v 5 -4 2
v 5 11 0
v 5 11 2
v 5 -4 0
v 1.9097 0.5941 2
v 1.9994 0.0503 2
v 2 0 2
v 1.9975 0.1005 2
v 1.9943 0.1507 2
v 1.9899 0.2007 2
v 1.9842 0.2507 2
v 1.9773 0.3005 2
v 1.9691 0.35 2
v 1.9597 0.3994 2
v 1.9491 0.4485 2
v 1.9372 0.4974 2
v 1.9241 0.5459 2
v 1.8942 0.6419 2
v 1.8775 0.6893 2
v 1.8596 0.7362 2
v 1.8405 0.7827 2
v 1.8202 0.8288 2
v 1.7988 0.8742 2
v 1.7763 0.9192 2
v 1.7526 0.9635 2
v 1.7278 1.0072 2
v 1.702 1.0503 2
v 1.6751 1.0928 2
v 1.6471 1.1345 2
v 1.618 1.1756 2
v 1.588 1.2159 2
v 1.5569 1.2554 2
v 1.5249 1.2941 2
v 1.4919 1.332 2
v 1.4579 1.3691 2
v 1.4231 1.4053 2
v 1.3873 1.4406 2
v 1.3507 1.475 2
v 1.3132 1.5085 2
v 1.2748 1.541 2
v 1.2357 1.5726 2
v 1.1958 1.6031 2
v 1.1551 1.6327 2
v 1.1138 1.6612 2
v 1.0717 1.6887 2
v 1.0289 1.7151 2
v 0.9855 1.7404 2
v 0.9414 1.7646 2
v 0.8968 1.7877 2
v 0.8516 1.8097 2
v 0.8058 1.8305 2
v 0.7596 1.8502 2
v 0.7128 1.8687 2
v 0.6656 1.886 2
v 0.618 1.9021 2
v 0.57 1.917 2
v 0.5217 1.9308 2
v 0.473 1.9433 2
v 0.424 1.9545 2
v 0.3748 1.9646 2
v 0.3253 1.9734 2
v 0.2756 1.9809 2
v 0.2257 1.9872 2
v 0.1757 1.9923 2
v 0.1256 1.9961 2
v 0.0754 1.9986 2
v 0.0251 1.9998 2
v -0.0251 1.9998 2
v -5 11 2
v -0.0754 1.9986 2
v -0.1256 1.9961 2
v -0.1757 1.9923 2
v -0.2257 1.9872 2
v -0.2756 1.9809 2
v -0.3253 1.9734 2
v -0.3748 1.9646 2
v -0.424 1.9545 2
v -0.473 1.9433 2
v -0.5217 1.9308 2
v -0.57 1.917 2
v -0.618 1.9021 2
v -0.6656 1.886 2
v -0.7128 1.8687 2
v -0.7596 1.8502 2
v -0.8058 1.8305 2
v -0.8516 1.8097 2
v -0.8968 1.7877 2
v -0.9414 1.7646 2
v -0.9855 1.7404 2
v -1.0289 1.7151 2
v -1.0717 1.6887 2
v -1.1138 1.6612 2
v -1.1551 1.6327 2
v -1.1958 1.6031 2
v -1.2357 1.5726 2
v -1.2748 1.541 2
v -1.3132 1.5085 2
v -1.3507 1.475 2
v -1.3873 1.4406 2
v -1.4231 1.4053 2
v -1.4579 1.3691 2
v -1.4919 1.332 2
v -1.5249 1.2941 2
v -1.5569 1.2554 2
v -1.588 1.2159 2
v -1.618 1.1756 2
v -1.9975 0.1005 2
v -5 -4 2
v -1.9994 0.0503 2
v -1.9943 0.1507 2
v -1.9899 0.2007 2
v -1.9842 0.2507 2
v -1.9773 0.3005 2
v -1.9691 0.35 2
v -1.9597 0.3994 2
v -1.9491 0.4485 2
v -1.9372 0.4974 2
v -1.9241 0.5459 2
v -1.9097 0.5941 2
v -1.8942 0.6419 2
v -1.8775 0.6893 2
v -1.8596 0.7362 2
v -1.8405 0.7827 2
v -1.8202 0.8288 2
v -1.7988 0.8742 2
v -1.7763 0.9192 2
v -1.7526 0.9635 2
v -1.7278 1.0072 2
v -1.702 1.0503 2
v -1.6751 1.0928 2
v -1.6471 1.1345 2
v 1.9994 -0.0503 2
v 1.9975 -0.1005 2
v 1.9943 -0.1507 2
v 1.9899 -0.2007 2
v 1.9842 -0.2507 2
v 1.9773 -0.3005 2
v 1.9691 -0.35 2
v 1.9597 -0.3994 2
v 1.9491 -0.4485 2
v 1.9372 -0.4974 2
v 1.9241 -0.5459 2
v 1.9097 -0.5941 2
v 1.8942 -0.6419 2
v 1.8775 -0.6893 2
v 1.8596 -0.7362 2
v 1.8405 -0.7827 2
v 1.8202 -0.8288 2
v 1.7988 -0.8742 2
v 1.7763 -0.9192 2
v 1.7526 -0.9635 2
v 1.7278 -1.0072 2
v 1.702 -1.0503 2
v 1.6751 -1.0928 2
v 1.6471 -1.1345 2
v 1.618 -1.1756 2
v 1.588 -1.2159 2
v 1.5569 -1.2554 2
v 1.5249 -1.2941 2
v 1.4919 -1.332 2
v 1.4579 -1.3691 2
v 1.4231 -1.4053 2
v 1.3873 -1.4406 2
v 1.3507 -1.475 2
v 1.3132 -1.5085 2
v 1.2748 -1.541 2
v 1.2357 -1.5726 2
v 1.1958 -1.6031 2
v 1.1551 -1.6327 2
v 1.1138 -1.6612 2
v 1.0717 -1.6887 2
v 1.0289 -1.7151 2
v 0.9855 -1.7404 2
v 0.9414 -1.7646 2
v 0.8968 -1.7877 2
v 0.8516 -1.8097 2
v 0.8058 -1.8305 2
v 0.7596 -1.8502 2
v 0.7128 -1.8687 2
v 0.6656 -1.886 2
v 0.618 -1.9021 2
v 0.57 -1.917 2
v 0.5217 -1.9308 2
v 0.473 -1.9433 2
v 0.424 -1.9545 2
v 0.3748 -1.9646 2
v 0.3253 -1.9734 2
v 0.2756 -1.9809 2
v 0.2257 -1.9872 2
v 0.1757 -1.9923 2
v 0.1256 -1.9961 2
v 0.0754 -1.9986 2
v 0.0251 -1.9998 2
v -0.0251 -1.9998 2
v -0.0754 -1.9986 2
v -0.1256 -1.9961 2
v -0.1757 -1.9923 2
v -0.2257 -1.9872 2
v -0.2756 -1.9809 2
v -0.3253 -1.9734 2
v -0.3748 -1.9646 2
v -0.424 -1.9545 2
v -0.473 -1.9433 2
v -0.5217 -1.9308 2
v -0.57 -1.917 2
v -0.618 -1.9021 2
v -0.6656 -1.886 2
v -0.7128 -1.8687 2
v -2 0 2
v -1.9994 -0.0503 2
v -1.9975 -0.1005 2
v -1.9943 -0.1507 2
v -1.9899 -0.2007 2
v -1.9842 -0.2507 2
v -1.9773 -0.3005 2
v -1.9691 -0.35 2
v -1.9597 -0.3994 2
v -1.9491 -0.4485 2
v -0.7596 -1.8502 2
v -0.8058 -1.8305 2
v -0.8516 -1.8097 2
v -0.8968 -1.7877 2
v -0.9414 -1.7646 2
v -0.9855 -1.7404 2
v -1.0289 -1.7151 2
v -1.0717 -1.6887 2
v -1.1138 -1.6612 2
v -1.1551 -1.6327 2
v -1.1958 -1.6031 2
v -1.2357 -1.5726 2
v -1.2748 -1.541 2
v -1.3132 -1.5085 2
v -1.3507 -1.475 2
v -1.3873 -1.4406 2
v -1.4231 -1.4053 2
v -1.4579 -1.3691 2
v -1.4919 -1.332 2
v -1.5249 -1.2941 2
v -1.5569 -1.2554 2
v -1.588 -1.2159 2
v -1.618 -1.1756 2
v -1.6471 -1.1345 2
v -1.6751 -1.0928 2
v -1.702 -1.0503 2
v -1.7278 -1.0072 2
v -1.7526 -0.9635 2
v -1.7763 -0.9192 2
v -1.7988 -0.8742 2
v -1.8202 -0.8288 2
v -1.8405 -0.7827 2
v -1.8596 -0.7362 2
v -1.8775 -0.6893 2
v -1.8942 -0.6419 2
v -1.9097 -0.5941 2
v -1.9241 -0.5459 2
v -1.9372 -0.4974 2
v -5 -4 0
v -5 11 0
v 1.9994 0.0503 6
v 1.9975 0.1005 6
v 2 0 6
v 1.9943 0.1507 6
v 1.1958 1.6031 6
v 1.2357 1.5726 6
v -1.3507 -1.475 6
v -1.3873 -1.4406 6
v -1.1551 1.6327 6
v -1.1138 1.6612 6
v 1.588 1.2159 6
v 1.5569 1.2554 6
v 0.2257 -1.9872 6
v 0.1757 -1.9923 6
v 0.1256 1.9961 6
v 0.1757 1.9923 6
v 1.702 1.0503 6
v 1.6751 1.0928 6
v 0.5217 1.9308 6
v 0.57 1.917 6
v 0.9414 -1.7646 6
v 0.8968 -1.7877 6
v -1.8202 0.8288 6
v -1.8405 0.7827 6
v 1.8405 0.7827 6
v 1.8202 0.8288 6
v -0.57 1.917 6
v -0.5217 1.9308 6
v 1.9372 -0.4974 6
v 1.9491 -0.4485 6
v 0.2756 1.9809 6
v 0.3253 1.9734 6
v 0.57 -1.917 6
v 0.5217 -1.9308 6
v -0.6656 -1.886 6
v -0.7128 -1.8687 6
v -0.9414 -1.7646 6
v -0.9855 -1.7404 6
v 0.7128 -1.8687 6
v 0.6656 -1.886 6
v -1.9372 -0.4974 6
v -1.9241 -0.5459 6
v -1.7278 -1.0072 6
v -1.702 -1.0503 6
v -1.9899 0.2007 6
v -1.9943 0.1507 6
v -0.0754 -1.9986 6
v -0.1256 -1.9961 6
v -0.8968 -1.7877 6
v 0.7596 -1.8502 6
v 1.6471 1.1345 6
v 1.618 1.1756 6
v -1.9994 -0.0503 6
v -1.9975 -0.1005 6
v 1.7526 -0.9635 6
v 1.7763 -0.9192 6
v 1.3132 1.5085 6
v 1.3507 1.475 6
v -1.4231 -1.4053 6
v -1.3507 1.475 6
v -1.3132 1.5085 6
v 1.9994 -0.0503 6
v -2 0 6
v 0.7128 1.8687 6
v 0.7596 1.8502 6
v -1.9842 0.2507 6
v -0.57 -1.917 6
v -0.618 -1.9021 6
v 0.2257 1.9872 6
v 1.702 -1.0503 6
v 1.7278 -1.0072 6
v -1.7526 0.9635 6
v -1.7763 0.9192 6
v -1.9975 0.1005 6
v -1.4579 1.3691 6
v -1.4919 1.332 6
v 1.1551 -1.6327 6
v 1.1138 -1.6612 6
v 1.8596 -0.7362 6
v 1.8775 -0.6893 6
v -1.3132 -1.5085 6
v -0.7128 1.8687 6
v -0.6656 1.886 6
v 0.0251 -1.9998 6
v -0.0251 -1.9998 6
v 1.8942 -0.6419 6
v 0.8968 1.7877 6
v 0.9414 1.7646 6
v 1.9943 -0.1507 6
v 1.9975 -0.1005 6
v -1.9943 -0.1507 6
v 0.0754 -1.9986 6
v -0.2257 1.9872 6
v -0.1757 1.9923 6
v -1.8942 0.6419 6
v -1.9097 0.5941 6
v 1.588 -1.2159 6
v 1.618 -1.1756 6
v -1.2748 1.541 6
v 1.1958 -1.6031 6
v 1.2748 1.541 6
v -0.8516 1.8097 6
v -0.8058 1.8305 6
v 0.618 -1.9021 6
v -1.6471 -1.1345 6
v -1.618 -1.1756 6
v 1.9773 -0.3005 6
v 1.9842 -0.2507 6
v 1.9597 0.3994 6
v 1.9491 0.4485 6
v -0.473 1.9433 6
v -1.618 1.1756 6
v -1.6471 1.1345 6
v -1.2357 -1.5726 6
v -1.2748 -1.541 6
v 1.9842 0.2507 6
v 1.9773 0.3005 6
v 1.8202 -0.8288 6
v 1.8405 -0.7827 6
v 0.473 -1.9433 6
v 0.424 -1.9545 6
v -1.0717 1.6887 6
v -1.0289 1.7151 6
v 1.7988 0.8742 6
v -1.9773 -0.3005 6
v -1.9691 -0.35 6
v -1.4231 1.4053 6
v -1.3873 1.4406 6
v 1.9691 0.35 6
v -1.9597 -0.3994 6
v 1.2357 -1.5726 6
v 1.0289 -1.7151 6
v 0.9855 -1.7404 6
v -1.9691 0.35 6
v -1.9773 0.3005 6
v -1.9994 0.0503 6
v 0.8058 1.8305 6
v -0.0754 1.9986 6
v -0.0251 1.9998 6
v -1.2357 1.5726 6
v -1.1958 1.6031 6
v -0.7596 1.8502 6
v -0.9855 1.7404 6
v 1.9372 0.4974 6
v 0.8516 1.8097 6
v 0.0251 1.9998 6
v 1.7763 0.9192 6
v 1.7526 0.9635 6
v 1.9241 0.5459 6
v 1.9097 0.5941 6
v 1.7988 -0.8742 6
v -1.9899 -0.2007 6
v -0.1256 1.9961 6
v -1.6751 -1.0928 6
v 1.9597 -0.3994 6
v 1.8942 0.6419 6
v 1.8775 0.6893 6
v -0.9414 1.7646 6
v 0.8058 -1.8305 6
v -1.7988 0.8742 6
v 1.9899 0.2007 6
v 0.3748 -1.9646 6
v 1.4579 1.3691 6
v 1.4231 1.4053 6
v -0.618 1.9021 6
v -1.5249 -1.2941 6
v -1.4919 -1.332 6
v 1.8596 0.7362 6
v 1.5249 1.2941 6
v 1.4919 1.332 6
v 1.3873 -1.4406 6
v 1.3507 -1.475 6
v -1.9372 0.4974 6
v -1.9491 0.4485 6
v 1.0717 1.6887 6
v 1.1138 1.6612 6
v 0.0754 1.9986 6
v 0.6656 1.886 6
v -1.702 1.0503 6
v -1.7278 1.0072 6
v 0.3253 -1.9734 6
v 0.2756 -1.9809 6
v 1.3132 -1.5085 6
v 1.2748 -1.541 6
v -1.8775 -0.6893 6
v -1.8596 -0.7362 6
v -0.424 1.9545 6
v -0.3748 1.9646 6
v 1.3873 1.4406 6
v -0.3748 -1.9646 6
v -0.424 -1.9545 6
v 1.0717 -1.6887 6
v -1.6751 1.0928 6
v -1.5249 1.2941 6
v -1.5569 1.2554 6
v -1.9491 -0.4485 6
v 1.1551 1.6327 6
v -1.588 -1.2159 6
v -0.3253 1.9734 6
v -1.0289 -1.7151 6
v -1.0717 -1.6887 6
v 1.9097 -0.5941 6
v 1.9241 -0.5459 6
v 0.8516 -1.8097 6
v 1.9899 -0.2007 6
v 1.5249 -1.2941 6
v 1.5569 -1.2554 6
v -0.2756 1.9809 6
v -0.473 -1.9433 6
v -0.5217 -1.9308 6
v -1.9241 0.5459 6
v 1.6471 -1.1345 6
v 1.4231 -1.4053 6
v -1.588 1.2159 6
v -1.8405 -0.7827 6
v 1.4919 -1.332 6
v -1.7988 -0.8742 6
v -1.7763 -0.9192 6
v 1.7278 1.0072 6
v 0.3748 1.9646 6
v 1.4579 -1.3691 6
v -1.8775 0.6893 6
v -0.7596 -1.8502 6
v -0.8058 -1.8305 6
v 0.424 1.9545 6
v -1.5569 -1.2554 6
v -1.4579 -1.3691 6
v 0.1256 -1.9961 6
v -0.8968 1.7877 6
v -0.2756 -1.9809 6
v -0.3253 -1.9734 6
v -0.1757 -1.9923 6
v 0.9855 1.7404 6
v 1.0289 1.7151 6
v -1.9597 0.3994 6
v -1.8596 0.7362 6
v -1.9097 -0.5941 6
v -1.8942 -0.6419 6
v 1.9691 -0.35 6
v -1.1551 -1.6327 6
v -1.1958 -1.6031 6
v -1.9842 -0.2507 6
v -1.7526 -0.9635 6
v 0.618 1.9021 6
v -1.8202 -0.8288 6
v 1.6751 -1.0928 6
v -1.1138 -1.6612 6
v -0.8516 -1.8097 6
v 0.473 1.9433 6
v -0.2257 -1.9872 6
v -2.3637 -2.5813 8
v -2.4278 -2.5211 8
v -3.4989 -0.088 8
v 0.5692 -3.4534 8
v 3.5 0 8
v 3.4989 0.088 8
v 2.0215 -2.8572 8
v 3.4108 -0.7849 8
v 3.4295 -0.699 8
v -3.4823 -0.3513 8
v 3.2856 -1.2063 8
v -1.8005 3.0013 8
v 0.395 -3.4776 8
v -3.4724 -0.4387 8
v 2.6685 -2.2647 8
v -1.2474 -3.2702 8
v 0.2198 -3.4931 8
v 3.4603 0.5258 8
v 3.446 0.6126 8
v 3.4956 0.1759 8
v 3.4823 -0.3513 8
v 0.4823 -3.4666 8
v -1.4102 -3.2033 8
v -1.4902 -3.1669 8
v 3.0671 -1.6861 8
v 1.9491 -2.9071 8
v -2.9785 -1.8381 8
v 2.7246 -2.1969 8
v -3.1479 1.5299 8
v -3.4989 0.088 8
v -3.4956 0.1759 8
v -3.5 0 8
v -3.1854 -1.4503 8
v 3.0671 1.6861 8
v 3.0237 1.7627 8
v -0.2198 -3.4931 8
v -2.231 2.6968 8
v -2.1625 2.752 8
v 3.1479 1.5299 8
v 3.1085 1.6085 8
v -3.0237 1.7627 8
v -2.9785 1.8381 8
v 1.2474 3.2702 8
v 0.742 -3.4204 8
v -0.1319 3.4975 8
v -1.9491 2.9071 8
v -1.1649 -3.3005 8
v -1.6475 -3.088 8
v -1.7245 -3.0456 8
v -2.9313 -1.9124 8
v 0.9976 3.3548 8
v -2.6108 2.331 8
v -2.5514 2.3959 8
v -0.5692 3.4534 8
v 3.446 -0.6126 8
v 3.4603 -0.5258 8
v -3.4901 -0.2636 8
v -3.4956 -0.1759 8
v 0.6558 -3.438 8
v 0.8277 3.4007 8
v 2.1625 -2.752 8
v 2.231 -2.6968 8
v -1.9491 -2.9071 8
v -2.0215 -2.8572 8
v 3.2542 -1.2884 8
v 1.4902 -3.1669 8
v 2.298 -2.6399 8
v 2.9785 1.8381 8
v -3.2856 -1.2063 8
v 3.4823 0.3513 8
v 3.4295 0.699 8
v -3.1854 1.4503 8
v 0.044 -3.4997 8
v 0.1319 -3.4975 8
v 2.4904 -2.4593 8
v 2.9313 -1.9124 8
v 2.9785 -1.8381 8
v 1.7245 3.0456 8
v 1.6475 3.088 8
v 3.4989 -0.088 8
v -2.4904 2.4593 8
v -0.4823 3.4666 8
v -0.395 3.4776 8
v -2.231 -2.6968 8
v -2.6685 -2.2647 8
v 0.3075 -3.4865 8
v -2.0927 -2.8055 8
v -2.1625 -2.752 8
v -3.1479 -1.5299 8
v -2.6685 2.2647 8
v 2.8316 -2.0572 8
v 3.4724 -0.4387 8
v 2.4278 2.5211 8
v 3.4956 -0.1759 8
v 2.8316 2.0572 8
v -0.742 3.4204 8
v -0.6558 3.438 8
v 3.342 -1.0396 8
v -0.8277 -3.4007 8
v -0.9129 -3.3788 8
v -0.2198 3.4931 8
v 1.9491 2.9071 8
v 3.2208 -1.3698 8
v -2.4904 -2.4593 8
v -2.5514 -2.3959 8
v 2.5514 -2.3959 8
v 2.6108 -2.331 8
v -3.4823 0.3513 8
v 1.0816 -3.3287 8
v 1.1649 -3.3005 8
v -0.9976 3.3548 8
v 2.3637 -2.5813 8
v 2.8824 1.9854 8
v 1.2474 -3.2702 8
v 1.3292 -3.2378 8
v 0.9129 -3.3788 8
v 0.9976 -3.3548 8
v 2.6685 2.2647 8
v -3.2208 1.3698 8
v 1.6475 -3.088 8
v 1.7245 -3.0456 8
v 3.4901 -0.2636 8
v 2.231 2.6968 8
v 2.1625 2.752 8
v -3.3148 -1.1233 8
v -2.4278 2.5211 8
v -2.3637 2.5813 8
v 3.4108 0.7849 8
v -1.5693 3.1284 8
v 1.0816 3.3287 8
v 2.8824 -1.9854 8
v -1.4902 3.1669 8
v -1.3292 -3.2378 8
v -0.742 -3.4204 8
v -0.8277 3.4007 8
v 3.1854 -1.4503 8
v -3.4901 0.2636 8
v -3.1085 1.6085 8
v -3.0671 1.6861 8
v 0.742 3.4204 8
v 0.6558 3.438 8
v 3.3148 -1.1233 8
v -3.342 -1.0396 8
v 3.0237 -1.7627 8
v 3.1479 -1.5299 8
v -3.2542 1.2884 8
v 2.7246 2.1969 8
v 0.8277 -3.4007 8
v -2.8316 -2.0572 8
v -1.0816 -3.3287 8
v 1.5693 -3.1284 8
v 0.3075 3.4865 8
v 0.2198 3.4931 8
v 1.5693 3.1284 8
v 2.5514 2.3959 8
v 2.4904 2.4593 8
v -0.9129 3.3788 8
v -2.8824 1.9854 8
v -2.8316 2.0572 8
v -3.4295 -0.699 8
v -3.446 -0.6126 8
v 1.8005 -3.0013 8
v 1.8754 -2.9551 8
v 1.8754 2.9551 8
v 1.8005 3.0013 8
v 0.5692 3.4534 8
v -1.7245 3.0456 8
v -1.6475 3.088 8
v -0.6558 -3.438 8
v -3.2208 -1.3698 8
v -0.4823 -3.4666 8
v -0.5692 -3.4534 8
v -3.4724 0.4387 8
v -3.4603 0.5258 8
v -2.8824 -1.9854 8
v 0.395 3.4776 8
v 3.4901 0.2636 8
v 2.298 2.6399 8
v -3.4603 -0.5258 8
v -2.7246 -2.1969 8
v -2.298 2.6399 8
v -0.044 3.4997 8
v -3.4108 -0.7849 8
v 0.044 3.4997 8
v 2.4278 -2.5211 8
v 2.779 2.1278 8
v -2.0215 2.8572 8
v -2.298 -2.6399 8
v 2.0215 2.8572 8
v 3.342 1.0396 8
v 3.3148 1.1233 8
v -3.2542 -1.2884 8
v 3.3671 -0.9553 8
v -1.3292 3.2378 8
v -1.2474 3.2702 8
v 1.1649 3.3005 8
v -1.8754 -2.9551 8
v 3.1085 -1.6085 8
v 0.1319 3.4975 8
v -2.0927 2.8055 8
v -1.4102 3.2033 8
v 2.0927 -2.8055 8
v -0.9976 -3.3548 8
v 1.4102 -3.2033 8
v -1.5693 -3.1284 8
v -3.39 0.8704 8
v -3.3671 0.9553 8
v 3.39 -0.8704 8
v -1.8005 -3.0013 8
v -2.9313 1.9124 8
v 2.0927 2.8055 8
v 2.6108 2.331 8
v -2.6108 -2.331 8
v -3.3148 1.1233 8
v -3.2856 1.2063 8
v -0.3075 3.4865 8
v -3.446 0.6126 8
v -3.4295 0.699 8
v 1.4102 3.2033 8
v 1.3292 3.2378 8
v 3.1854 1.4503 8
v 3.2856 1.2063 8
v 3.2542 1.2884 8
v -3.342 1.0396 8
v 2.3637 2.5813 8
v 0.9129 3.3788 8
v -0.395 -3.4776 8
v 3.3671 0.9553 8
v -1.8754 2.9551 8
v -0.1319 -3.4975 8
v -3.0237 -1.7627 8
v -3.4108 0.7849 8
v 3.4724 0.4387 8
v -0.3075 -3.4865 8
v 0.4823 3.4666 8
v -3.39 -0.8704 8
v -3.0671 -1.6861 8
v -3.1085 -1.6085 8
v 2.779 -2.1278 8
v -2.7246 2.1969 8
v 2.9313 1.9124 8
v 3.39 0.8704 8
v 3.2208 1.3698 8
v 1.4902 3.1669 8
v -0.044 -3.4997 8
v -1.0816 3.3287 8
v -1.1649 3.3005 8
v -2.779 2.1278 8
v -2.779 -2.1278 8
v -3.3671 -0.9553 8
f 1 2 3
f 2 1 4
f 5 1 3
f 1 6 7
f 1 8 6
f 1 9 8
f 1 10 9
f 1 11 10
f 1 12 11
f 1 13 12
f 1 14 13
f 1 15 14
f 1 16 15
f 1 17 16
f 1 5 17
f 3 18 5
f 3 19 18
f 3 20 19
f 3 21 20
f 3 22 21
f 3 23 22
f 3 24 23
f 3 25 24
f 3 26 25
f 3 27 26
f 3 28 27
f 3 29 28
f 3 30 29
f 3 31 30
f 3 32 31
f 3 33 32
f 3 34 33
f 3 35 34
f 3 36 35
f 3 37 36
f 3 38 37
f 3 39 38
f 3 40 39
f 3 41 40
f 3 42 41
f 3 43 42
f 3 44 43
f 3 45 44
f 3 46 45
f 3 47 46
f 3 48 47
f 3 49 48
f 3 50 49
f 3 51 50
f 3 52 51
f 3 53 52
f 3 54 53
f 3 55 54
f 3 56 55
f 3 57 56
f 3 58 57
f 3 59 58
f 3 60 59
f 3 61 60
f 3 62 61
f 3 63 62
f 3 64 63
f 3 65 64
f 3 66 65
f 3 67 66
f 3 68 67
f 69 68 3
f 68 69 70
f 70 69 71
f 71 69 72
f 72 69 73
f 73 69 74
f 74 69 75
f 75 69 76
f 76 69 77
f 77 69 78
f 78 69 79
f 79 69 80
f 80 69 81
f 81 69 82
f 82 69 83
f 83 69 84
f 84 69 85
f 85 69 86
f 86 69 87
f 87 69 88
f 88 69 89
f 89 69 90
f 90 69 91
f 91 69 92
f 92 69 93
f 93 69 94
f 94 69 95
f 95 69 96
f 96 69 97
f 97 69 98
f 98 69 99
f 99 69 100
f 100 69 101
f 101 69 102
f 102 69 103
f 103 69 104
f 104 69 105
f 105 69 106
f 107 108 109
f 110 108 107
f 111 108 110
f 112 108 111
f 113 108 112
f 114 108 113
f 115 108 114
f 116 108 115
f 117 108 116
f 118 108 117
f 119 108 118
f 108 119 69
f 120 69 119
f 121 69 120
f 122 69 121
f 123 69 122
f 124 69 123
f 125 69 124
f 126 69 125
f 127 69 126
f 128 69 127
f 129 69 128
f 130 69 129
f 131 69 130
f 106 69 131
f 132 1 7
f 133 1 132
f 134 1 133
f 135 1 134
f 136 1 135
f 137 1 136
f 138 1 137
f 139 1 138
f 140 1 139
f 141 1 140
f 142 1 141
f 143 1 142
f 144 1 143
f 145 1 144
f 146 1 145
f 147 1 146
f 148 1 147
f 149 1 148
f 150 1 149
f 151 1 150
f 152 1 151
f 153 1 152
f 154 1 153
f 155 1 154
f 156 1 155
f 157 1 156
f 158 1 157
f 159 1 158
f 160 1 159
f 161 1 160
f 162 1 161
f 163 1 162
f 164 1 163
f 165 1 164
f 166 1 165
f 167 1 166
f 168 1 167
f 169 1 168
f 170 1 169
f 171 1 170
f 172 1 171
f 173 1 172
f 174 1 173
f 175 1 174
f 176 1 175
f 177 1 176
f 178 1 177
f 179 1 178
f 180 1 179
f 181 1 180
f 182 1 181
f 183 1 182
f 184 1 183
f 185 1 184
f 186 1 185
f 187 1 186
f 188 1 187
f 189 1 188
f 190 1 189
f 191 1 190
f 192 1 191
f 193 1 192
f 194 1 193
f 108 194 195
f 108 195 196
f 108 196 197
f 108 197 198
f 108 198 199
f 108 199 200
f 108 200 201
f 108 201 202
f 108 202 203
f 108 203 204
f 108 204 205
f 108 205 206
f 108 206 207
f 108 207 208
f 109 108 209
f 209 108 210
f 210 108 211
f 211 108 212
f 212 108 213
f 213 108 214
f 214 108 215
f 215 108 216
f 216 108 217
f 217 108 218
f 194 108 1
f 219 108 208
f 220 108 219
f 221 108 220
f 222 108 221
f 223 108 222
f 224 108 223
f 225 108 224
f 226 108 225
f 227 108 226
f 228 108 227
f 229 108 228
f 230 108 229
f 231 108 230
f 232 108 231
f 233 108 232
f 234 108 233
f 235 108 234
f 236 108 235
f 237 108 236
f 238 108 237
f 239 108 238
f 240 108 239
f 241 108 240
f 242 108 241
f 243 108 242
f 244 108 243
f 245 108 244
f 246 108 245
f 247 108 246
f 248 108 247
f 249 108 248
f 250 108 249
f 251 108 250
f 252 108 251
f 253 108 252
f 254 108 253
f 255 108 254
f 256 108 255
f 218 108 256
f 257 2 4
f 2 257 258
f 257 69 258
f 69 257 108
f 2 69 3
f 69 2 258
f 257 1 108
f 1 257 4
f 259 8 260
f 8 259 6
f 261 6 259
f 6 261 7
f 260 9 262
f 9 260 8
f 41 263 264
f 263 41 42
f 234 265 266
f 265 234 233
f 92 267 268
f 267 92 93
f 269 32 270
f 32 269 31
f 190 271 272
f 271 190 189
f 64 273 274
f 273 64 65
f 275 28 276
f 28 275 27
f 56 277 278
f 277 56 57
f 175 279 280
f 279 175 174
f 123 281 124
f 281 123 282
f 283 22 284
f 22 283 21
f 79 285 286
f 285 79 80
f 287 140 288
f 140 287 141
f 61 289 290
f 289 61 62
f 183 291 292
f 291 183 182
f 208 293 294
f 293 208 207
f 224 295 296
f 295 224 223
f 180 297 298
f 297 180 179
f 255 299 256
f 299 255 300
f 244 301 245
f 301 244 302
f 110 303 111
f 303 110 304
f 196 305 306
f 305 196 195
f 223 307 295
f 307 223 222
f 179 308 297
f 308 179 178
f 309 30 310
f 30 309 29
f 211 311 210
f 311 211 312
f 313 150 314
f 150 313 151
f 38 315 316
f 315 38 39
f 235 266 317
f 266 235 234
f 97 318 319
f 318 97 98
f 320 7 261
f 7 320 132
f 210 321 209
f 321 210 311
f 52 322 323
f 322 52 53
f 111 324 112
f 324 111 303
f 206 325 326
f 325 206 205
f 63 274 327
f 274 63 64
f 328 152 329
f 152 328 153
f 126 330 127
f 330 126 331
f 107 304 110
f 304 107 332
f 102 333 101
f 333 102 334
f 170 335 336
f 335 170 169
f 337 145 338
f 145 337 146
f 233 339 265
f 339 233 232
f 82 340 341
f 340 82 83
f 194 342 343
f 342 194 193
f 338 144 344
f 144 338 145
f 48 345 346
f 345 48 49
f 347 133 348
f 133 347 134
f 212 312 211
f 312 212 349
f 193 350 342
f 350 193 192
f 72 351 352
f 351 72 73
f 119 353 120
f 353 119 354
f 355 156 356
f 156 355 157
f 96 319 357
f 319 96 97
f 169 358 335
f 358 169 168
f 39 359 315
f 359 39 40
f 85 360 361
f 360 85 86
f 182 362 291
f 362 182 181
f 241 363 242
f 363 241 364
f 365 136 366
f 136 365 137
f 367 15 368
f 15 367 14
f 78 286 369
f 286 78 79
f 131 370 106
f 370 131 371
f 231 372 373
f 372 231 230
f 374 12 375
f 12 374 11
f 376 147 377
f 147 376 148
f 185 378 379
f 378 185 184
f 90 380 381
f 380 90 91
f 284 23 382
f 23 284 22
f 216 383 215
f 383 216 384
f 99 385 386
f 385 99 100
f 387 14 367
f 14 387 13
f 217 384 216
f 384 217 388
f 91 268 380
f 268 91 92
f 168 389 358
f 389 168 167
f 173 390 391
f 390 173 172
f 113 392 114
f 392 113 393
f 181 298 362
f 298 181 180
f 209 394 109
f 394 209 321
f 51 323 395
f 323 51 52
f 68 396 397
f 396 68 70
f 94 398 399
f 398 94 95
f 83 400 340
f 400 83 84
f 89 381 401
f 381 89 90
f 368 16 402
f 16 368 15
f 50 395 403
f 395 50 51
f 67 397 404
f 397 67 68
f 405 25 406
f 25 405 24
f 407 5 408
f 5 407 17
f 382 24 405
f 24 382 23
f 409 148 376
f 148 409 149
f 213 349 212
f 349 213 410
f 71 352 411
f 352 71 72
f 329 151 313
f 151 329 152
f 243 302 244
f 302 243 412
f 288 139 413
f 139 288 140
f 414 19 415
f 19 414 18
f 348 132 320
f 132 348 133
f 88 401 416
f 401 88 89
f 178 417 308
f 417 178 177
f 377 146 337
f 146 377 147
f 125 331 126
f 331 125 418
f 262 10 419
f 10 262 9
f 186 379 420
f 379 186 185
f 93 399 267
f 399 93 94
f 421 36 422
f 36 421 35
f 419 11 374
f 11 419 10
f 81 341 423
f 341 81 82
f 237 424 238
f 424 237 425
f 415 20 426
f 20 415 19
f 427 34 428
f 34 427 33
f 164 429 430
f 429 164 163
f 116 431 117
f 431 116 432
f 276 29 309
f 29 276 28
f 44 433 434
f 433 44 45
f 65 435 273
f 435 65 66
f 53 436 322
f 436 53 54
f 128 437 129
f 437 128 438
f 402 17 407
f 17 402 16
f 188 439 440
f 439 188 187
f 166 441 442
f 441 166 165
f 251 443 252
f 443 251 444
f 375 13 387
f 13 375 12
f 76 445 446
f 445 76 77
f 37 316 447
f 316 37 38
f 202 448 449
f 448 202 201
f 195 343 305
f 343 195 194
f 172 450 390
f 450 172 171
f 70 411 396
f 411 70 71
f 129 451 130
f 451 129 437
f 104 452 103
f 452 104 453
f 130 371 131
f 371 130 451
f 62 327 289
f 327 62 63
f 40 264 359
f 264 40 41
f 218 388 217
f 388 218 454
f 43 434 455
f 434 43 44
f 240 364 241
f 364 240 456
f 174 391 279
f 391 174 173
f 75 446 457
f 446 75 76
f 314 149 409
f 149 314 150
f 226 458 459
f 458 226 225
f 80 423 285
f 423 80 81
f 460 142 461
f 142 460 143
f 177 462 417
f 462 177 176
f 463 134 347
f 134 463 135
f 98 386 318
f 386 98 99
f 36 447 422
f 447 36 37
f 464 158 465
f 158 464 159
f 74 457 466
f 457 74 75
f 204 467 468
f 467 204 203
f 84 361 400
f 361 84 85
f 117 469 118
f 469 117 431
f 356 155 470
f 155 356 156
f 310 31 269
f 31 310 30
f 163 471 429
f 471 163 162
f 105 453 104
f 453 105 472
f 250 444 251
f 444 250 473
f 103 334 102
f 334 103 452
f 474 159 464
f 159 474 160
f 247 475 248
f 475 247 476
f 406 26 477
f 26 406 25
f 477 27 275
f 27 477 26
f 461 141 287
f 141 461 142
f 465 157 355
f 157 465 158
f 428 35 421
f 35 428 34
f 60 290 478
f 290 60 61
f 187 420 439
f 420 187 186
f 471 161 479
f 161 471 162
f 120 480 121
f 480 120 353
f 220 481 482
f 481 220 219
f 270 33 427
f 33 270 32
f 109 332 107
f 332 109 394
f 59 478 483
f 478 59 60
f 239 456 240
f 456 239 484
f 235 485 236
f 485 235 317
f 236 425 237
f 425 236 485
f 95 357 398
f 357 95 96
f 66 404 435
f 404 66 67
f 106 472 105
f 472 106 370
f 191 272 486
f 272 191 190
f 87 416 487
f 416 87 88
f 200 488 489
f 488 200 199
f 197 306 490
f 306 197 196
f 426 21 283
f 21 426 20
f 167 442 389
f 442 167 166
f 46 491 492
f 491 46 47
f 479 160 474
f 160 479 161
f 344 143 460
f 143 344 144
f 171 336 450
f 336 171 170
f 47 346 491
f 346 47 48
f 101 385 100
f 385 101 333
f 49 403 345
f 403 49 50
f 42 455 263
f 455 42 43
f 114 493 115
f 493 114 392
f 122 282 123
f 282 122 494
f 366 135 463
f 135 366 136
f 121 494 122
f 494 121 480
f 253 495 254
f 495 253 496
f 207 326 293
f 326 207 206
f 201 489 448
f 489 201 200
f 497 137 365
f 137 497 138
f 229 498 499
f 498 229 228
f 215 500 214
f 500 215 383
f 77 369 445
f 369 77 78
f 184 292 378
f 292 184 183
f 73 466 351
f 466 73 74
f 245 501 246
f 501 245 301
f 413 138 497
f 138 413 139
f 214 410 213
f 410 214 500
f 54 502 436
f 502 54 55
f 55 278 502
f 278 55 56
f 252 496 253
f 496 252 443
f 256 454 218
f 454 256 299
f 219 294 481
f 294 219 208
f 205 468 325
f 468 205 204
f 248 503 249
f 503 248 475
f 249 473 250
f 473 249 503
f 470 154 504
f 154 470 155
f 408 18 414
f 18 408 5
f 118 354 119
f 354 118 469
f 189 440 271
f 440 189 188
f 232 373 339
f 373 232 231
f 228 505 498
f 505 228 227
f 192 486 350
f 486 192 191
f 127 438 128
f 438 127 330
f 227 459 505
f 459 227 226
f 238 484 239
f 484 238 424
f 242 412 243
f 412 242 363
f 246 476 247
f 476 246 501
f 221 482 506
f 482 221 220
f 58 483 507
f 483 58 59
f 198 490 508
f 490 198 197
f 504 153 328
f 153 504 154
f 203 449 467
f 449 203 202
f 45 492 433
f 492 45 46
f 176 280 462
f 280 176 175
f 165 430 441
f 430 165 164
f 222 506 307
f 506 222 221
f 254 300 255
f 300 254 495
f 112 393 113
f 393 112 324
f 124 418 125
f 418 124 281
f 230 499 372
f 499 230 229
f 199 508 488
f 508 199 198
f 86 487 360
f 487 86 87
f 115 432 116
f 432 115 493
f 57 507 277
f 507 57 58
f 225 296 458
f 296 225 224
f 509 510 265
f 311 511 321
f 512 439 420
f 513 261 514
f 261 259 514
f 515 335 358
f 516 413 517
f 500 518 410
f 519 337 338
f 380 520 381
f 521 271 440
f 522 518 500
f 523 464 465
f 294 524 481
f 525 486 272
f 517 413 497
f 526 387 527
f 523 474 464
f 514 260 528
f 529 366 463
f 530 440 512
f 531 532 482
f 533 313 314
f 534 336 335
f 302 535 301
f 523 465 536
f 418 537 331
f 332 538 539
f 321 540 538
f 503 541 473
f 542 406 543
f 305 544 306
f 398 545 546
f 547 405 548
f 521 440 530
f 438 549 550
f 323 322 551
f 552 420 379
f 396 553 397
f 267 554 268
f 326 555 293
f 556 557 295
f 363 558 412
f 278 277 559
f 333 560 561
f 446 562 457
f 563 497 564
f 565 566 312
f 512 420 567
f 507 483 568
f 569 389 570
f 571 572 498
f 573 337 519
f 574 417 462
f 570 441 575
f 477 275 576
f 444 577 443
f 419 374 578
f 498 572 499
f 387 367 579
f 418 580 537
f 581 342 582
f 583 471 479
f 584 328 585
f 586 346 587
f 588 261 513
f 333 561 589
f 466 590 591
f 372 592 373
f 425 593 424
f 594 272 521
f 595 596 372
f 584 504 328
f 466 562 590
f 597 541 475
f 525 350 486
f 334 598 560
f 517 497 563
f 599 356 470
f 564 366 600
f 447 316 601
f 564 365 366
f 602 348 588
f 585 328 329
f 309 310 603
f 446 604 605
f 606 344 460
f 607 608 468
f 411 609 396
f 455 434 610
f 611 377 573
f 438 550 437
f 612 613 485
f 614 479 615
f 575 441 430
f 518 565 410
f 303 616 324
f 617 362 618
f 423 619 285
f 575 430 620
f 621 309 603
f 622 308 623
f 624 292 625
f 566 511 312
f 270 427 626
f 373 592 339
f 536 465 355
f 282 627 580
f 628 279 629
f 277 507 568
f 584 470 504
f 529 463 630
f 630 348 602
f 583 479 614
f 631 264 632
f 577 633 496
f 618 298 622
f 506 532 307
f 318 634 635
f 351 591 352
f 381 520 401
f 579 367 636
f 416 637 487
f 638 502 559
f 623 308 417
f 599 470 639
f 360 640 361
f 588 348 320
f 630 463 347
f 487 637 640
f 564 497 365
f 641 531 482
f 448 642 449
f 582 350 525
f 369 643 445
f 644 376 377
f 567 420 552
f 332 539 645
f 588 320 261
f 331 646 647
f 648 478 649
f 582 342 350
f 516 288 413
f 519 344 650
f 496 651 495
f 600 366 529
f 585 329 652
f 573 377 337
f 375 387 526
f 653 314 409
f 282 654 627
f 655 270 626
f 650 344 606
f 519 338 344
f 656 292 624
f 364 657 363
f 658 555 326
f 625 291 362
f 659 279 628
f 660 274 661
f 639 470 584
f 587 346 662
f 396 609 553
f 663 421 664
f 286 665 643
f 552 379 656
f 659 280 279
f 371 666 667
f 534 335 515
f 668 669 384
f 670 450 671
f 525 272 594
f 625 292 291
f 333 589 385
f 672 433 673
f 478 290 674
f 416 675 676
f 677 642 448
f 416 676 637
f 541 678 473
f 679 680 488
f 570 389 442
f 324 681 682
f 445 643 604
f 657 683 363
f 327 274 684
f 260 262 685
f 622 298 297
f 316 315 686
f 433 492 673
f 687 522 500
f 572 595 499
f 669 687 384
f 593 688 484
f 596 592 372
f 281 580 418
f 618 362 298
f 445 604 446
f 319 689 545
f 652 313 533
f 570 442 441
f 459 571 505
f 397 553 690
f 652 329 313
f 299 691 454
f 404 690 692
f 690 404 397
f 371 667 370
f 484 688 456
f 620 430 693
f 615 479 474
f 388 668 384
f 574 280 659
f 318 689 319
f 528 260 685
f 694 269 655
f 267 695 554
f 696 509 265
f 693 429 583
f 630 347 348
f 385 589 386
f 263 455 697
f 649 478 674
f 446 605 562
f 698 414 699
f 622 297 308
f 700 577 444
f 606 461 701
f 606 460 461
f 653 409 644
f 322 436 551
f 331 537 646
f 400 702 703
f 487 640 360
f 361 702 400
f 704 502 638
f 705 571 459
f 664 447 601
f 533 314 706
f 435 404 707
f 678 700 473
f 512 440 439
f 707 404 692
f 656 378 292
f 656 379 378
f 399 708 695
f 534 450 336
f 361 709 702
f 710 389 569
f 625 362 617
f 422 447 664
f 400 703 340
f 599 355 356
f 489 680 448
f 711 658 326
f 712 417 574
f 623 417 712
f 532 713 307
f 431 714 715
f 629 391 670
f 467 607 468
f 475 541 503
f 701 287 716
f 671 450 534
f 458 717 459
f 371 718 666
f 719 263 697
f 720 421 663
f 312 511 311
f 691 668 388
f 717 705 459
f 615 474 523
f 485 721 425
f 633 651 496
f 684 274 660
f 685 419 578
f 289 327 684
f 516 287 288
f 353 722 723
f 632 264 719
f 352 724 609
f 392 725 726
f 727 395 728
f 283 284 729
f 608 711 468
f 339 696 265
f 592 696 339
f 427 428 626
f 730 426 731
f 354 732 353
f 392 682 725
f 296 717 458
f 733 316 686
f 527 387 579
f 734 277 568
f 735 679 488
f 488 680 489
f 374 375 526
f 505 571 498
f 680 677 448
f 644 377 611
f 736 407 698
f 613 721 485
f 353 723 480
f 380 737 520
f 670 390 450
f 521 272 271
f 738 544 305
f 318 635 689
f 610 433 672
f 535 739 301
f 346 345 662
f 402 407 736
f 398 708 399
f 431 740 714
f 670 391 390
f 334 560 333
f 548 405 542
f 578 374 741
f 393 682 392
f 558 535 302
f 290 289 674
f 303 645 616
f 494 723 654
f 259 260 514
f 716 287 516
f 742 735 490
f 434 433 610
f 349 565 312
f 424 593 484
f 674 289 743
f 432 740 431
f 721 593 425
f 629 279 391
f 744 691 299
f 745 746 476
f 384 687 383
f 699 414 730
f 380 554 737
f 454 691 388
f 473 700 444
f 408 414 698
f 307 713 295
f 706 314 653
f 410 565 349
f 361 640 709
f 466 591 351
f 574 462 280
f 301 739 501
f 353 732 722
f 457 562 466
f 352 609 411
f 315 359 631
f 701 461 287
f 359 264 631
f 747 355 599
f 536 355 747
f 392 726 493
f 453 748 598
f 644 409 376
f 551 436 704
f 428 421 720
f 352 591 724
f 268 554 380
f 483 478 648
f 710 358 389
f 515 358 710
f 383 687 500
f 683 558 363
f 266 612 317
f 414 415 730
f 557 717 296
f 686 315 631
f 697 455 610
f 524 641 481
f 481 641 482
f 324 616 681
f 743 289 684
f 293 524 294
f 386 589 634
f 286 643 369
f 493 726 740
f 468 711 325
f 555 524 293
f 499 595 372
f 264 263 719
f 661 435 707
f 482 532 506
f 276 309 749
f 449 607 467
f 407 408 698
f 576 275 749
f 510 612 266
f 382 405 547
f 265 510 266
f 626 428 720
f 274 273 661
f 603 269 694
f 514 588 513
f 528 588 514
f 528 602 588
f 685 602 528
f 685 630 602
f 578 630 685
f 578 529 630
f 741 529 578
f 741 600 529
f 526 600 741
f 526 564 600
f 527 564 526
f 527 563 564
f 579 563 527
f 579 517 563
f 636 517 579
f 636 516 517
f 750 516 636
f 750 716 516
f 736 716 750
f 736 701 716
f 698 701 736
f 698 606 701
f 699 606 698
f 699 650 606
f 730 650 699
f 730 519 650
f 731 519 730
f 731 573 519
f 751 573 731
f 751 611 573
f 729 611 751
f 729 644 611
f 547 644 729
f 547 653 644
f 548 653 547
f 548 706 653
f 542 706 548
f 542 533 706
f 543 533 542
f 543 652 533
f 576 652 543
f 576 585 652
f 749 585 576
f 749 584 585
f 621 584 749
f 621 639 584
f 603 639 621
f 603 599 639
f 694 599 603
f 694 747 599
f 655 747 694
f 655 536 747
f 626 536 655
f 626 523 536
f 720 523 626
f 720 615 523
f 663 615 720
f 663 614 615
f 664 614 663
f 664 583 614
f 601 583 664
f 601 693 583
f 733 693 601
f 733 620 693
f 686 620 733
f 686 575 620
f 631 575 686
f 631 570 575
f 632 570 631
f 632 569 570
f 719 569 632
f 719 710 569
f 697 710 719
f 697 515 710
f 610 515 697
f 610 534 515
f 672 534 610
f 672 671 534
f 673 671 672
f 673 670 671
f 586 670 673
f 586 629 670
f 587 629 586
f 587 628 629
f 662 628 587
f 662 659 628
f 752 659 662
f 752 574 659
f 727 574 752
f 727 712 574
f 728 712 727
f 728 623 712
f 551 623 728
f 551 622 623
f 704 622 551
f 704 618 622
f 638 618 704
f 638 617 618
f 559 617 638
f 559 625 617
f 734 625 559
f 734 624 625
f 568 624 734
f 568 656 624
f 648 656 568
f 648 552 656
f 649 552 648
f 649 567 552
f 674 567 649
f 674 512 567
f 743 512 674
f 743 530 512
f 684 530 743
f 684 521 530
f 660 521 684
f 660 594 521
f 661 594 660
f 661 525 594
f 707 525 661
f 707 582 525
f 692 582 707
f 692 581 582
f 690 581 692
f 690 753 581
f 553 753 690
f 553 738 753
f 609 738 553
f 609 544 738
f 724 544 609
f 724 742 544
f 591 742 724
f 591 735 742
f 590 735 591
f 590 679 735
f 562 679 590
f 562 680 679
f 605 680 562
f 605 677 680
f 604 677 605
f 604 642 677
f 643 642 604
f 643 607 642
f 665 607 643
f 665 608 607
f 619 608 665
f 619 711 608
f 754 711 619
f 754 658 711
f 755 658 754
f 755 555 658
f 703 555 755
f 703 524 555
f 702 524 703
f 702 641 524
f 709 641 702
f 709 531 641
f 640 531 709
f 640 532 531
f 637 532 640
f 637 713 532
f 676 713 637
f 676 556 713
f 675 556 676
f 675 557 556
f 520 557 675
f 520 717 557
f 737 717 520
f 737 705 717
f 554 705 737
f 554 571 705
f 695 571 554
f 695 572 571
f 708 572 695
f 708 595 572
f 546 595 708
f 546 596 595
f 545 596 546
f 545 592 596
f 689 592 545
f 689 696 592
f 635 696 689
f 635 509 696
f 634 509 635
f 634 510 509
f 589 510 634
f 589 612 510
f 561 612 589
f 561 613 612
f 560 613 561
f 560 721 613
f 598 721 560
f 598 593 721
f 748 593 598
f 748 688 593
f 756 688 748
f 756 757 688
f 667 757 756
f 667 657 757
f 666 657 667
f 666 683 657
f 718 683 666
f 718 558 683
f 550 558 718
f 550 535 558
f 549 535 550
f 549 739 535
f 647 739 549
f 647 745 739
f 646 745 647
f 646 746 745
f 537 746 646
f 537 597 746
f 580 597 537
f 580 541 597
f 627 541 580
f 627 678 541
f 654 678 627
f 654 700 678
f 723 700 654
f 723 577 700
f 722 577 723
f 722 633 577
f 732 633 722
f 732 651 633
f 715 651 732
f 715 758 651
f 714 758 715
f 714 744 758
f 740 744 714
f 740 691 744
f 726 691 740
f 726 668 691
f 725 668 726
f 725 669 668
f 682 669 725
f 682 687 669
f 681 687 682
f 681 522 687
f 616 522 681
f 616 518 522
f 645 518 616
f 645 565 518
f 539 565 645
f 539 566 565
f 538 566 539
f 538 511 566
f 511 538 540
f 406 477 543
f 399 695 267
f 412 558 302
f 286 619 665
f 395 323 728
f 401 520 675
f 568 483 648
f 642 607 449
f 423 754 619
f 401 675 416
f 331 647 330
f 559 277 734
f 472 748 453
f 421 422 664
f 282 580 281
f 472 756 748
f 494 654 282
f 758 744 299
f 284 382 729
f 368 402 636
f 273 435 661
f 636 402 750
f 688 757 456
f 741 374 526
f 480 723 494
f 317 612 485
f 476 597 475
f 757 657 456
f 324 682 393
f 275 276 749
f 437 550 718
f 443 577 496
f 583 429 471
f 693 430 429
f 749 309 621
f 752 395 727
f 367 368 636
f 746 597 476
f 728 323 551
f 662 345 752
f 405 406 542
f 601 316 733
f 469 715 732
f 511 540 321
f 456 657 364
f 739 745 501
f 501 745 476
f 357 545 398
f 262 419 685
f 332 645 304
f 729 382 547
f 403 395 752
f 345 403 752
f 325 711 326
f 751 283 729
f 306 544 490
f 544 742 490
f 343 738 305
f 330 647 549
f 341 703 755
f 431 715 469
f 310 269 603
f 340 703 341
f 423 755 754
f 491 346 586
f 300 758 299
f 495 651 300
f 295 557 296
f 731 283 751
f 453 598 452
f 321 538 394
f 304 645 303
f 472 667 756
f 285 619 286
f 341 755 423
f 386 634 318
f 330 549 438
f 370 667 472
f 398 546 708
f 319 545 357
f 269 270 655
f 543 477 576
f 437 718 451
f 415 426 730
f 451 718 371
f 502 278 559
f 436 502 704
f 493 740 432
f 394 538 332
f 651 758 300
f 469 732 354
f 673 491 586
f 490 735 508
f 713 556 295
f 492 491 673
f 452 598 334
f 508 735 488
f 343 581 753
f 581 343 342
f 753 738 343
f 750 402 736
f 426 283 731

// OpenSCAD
$fn=250;

translate([-5,-4,0]) cube([10,15,2]);
translate([0,0,0])  cylinder(h=6,d=4);
translate([0,0,6]) cylinder(h=2,d1=4,d2=7);
